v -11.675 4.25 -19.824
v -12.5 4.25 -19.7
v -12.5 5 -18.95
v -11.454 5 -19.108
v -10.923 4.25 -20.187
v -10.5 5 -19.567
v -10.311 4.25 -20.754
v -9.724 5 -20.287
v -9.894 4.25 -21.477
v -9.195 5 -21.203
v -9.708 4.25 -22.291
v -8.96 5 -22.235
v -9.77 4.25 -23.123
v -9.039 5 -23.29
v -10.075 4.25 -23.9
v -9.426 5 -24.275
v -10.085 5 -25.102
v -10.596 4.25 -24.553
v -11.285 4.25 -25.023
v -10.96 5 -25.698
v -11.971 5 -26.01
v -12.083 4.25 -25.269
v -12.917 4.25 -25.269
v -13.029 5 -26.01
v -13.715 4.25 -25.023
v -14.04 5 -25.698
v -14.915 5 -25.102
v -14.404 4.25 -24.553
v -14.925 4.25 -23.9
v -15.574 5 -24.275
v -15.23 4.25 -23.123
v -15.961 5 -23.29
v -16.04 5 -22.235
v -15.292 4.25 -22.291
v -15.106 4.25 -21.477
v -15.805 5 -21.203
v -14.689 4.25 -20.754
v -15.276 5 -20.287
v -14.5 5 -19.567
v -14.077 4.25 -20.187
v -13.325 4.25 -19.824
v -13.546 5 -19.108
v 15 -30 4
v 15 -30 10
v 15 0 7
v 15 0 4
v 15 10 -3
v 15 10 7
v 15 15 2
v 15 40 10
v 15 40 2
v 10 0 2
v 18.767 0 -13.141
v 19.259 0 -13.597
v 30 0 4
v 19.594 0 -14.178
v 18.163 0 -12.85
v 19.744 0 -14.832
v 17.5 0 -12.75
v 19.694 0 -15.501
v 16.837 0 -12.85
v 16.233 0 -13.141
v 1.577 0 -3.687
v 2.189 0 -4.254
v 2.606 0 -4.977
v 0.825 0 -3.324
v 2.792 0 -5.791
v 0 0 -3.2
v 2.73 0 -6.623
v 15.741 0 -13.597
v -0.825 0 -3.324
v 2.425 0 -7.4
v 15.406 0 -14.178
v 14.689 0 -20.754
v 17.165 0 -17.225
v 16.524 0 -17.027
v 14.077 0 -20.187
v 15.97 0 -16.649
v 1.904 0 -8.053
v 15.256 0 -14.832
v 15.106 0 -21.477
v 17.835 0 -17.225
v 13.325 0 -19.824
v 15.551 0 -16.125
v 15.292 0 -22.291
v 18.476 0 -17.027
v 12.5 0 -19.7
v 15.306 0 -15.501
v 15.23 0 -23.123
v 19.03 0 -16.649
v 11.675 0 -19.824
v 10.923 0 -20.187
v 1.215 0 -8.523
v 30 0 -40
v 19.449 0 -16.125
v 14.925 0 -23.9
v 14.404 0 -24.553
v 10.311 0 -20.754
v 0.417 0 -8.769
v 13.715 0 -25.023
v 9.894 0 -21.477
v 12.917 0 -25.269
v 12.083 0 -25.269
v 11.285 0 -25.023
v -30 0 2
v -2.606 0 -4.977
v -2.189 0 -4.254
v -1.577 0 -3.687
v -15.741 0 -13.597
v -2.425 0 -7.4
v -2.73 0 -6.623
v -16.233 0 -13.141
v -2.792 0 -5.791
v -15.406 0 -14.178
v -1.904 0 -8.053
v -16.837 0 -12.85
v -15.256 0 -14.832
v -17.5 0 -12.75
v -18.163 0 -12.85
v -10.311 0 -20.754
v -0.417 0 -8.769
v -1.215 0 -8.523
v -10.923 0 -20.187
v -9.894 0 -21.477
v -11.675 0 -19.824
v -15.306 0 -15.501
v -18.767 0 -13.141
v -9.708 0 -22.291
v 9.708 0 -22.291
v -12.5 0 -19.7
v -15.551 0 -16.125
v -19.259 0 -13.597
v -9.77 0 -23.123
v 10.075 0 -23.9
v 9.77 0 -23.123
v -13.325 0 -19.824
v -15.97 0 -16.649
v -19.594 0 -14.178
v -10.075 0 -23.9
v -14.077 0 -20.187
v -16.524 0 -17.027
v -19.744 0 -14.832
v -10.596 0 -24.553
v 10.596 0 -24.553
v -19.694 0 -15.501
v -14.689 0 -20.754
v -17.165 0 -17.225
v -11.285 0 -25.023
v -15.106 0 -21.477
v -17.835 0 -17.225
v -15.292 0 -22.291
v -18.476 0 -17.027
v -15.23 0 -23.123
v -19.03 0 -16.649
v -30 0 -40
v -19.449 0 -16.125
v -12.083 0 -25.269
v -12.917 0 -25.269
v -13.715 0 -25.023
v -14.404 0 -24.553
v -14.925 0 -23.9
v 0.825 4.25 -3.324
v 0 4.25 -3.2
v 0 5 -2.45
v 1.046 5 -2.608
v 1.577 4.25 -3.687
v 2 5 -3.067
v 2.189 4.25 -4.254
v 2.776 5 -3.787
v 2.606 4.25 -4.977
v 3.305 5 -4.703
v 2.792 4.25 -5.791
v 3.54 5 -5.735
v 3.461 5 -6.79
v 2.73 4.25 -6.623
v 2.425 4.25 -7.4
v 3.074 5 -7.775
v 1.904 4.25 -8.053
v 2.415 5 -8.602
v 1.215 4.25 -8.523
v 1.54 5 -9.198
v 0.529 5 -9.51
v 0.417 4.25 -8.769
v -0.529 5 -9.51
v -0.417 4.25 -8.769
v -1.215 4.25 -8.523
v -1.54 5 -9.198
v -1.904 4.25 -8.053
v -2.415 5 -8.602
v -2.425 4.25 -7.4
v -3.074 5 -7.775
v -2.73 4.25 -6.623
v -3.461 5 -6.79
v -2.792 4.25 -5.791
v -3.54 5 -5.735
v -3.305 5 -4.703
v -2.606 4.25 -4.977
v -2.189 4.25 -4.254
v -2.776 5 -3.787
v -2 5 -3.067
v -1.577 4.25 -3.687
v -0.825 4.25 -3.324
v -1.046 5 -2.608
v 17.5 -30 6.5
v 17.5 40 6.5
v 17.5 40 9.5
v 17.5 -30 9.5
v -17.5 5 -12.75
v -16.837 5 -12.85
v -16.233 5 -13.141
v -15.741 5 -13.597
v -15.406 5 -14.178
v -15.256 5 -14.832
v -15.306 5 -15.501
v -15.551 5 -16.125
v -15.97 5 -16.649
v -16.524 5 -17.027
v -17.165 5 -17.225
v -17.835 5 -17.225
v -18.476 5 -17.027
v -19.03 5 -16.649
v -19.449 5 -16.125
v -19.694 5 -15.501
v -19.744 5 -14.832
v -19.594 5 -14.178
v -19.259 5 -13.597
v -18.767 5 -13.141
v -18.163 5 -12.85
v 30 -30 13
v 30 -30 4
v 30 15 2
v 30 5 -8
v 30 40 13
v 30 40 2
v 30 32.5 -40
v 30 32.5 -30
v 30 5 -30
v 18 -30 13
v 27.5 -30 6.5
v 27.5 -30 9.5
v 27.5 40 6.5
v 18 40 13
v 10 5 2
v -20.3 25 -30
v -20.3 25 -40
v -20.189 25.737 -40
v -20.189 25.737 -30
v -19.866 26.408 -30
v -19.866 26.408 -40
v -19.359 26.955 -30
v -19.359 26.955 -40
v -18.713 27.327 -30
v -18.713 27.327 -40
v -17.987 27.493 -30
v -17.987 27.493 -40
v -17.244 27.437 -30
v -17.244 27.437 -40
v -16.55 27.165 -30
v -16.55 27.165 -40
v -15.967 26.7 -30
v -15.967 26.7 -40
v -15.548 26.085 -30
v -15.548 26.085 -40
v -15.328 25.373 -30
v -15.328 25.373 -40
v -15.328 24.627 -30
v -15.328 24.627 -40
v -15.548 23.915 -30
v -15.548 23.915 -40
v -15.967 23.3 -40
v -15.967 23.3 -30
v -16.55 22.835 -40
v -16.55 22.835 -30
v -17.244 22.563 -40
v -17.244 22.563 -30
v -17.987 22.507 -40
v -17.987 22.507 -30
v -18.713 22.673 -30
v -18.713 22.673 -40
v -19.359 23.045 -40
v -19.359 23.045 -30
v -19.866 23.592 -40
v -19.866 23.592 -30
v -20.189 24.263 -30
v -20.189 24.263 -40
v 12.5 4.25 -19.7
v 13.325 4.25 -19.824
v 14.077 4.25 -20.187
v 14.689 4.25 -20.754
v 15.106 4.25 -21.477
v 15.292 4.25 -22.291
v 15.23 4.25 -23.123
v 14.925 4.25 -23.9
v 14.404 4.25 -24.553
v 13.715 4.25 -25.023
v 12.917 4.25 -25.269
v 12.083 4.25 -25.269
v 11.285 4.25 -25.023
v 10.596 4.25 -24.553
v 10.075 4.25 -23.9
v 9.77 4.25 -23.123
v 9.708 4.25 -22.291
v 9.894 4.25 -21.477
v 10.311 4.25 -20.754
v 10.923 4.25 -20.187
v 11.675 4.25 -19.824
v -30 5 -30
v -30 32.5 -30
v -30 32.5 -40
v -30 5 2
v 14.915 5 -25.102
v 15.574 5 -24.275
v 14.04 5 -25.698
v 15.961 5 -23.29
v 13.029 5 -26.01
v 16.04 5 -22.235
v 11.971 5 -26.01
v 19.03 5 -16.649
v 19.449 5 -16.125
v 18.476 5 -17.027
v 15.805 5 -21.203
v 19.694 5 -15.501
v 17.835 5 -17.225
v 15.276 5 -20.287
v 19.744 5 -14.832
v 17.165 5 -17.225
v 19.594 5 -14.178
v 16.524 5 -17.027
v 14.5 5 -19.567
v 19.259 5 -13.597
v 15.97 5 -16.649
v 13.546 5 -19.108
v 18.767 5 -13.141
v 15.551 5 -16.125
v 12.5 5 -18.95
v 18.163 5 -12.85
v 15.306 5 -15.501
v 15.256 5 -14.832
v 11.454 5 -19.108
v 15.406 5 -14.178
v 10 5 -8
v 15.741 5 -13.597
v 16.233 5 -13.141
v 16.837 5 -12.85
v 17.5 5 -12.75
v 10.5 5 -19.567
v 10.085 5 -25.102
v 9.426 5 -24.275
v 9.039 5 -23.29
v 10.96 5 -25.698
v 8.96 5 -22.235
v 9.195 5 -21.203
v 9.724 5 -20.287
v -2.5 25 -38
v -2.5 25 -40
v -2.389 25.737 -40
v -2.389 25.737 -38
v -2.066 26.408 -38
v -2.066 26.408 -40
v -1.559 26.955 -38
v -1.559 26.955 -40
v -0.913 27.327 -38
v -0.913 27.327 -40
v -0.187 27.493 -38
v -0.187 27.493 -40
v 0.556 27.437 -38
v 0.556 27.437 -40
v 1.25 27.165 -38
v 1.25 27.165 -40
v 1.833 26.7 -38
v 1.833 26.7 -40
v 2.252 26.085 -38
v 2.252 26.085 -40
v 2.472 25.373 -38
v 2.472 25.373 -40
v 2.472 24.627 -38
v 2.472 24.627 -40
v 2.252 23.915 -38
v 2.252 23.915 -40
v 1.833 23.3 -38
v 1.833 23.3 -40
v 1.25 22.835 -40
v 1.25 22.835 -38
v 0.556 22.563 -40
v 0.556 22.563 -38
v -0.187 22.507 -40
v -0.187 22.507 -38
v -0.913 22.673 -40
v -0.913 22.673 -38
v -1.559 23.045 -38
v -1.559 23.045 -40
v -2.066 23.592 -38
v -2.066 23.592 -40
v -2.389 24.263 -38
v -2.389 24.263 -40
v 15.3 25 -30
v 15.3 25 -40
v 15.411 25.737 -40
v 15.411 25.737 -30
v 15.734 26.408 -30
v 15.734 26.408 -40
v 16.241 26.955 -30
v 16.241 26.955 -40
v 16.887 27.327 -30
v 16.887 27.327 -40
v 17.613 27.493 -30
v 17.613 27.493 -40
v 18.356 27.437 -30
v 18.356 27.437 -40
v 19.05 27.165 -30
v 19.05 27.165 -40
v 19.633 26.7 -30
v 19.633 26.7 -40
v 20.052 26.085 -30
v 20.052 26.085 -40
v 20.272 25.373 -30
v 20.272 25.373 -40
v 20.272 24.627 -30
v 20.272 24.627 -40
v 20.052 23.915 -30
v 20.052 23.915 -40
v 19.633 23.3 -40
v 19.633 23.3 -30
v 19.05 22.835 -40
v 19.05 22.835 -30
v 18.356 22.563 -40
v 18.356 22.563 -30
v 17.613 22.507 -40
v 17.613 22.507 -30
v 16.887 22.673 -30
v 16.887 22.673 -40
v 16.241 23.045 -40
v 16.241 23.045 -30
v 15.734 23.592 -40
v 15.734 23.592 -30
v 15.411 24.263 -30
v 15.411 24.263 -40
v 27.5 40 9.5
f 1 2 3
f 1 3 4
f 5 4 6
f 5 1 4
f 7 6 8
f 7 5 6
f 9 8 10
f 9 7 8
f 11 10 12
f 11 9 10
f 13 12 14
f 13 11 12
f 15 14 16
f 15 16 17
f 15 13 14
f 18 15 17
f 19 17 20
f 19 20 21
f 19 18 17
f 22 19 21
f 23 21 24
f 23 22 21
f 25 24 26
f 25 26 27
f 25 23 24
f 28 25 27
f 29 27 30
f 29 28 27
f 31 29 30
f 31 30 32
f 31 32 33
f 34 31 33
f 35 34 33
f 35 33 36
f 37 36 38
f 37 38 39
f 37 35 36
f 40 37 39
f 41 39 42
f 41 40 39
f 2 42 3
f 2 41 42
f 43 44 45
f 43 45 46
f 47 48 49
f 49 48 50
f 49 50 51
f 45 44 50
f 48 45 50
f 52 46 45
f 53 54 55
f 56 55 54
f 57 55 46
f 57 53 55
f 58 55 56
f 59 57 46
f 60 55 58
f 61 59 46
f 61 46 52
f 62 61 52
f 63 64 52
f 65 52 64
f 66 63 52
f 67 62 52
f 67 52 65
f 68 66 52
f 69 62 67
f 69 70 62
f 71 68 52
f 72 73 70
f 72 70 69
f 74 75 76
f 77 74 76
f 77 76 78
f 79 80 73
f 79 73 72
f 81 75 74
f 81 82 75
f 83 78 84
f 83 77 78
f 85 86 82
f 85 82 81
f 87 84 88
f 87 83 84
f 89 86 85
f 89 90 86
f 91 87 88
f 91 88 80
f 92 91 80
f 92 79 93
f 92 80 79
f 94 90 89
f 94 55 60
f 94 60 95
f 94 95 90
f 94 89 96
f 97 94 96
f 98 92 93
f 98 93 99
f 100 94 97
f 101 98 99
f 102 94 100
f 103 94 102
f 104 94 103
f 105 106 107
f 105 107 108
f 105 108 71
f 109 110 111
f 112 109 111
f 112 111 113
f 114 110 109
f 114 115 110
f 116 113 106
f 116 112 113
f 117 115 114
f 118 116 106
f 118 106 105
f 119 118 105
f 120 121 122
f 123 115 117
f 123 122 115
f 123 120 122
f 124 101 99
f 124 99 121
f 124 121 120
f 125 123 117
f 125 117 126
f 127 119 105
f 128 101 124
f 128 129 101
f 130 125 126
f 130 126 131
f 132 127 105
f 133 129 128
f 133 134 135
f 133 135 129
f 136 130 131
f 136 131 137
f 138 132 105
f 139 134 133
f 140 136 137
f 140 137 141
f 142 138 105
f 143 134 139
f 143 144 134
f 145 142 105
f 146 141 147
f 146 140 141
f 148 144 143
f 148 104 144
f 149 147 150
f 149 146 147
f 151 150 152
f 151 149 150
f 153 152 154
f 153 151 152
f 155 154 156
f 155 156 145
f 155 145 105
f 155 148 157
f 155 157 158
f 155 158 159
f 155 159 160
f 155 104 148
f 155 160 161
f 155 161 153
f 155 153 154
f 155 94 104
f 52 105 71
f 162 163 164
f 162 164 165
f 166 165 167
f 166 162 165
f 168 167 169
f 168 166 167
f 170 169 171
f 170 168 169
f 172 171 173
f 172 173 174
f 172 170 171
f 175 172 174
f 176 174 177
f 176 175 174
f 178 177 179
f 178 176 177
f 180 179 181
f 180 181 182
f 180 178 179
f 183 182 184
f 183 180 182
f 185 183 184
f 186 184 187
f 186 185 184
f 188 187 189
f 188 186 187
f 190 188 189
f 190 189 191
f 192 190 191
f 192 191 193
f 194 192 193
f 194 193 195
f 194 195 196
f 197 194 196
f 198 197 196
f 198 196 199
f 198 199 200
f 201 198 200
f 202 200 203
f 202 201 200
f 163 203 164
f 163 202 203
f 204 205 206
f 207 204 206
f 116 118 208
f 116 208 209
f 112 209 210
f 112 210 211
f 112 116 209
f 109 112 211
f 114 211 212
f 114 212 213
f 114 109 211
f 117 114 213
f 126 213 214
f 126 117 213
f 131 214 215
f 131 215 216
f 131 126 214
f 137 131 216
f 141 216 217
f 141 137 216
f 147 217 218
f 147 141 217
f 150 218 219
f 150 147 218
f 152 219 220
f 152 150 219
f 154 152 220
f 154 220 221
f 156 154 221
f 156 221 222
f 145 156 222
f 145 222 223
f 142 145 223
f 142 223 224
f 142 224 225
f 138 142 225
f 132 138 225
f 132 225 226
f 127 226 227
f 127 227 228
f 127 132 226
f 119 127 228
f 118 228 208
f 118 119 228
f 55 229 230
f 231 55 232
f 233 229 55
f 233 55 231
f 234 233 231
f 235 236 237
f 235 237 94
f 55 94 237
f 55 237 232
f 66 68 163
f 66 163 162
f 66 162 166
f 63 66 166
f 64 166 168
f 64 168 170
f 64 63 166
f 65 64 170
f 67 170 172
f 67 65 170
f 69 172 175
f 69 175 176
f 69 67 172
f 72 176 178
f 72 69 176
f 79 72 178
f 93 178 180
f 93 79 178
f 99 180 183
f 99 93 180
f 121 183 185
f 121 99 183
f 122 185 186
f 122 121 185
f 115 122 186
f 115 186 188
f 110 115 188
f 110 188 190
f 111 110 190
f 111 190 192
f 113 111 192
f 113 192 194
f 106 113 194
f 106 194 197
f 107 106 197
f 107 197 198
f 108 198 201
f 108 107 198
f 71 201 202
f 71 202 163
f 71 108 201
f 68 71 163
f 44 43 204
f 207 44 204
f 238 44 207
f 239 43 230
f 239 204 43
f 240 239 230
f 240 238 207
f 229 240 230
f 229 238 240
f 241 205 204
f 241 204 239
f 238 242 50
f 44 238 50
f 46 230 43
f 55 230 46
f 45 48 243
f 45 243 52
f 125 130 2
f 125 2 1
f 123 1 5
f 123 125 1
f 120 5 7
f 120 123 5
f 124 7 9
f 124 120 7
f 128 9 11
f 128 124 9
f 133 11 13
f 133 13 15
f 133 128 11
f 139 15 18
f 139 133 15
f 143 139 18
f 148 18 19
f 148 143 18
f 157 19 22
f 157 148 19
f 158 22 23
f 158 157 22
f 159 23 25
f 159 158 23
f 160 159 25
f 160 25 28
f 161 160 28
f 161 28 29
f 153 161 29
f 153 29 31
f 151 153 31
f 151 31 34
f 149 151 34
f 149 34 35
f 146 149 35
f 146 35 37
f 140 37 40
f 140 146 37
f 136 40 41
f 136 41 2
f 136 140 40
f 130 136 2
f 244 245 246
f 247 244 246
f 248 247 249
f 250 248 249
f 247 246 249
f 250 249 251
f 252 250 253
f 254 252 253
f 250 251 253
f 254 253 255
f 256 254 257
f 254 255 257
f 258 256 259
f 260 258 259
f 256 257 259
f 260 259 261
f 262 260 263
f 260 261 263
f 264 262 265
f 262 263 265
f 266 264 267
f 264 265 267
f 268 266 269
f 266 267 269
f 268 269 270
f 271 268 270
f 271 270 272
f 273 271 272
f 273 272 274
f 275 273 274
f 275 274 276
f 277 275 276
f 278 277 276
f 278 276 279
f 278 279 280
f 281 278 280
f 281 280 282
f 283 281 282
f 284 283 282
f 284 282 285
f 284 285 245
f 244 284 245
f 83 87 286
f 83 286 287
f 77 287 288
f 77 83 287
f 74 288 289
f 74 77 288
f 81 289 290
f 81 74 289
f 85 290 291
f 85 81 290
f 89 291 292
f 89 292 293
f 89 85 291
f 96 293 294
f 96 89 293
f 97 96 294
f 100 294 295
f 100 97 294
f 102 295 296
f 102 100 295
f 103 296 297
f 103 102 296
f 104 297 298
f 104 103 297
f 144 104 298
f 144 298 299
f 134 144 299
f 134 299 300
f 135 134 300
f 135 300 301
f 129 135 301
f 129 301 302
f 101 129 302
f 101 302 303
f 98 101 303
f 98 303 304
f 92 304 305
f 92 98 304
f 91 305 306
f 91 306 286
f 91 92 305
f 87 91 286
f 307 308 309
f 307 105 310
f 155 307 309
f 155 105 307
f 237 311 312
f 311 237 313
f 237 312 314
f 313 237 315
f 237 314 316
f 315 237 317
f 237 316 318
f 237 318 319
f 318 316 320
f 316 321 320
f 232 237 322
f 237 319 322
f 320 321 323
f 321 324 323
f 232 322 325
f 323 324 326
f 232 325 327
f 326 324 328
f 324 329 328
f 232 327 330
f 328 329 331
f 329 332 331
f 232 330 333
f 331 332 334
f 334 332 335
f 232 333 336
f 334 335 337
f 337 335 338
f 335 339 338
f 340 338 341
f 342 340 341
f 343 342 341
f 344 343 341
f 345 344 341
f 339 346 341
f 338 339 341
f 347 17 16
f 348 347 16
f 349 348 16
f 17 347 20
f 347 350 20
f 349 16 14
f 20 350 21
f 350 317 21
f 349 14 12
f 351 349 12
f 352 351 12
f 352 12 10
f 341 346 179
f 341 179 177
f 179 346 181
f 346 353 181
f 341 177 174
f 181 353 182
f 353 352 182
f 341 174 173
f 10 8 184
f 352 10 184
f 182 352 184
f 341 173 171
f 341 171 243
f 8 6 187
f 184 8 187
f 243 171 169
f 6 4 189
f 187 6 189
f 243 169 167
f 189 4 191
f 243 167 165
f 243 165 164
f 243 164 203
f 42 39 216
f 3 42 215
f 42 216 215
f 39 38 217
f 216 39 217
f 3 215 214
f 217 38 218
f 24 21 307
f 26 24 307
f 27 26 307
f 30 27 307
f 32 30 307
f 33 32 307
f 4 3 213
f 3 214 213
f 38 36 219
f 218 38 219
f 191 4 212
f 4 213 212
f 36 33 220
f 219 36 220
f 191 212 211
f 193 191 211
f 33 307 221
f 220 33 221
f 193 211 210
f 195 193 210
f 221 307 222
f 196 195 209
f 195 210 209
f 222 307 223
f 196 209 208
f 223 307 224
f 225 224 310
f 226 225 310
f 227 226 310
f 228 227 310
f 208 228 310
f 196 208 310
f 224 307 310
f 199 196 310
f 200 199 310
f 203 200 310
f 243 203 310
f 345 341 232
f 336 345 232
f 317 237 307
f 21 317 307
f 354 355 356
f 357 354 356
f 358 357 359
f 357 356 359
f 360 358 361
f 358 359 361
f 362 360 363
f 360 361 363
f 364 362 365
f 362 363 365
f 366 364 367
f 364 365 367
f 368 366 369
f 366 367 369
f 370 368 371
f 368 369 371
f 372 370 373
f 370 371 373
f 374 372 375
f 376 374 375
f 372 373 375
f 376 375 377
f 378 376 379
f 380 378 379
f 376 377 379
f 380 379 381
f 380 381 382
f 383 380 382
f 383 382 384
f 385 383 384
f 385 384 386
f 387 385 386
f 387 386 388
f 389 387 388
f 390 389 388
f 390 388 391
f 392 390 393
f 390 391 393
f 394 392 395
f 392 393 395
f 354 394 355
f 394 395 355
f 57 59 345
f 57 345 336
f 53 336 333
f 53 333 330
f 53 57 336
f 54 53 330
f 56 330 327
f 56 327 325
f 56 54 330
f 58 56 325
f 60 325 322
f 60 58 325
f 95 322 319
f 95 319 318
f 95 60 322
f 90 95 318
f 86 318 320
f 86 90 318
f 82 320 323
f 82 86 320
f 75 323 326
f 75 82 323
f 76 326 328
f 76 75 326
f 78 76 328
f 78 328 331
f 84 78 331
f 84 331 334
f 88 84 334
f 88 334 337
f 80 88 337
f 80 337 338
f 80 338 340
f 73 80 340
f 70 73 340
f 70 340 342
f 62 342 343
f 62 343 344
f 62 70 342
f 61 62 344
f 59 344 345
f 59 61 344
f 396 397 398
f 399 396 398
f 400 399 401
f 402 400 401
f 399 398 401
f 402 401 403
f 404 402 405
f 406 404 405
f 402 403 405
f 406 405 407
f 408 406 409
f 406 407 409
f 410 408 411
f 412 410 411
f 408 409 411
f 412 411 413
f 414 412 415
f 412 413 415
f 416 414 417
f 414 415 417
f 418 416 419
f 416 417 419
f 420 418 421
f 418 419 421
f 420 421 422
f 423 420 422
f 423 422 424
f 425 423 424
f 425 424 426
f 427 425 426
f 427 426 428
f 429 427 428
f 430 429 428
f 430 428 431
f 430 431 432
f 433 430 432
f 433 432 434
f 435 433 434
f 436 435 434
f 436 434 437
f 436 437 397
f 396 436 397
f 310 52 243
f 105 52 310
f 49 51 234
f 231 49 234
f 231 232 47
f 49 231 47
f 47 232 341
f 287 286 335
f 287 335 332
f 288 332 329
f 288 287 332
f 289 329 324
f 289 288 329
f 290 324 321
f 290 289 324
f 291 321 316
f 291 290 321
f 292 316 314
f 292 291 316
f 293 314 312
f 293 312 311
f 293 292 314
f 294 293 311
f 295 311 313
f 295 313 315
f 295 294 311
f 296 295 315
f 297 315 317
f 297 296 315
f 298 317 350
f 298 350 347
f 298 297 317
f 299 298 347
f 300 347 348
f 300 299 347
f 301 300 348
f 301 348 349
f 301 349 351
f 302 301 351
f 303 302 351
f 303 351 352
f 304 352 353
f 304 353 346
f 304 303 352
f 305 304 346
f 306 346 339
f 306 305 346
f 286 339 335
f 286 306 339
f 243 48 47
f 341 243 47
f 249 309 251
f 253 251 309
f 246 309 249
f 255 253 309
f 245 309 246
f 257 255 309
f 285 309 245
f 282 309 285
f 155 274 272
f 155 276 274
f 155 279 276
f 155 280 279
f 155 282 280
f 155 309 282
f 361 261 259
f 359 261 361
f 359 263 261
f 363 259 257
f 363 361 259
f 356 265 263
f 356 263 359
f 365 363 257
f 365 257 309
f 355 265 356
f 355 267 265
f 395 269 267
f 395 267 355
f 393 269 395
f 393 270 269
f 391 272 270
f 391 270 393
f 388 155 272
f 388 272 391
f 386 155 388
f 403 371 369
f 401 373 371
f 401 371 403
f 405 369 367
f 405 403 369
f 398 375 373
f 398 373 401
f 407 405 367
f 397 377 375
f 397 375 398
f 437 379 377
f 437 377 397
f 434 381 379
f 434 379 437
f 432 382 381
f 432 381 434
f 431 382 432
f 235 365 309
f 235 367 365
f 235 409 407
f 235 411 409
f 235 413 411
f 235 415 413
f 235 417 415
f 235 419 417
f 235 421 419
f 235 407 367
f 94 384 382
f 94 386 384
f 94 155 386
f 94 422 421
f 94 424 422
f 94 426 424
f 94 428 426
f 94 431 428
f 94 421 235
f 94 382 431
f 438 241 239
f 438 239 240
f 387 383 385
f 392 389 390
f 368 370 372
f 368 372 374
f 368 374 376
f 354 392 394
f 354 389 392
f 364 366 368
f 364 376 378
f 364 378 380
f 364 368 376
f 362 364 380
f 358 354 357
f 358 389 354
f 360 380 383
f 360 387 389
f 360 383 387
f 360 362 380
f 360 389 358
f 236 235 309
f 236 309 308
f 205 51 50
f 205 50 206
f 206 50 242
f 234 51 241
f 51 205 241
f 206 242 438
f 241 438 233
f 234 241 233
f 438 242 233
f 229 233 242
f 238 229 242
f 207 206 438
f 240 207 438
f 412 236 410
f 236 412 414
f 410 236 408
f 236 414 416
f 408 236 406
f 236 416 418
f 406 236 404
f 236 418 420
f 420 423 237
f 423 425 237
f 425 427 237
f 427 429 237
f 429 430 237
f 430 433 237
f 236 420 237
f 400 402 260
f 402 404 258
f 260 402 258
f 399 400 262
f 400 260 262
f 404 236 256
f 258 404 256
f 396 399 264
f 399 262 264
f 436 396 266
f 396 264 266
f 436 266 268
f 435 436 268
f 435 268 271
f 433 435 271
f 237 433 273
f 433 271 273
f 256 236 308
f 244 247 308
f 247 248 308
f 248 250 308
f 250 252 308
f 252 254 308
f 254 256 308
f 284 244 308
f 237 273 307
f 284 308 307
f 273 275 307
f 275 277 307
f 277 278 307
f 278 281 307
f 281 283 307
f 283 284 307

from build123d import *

# Parameters (mm, degrees)
SKETCH1_R                = 2.8
SKETCH1_R_2              = 2.25
BOSS_EXTRUDE1_DEPTH      = 5
SKETCH3_W                = 60
SKETCH3_H                = 10
BOSS_EXTRUDE3_DEPTH      = 27.5
SKETCH4_R                = 2.5
CUT_EXTRUDE1_DEPTH       = 61.993852149
CHAMFER1_SIZE            = 0.75
BOSS_EXTRUDE4_DEPTH      = 30
BOSS_EXTRUDE4_DEPTH_BACK = 40
SKETCH5_W                = 10
SKETCH5_H                = 3
CHAMFER2_SIZE            = 10
CHAMFER3_SIZE            = 5
SKETCH7_W                = 2
SKETCH7_H                = 30
CUT_EXTRUDE2_DEPTH       = 83.462112512
BOSS_EXTRUDE5_DEPTH      = 5
CUT_EXTRUDE3_DEPTH       = 79.89866919
SKETCH10_R               = 2.5
CUT_EXTRUDE4_DEPTH       = 2


with BuildPart() as part:
    # Sketch1 → Boss-Extrude1 (new body)
    with BuildSketch(Plane(origin=(0, 0, 0), x_dir=(1, 0, 0), z_dir=(0, 1, 0))):
        Polygon((-30, 0), (-30, 40), (30, 40), (30, 0), (30, -2), (-30, -2), align=None)
        with Locations(Location((-12.5, 22.5, 0), (0, 0, 270))):
            Circle(SKETCH1_R, mode=Mode.SUBTRACT)
        with Locations(Location((12.5, 22.5, 0), (0, 0, 270))):
            Circle(SKETCH1_R, mode=Mode.SUBTRACT)
        with Locations(Location((-17.5, 15, 0), (0, 0, 270))):
            Circle(SKETCH1_R_2, mode=Mode.SUBTRACT)
        with Locations(Location((17.5, 15, 0), (0, 0, 270))):
            Circle(SKETCH1_R_2, mode=Mode.SUBTRACT)
        with Locations(Location((0, 6, 0), (0, 0, 270))):
            Circle(SKETCH1_R, mode=Mode.SUBTRACT)
    extrude(amount=BOSS_EXTRUDE1_DEPTH)

    # Sketch3 → Boss-Extrude3 (add)
    with BuildSketch(Plane(origin=(0, 5, 0), x_dir=(1, 0, 0), z_dir=(0, 1, 0))):
        with Locations((0, 35)):
            Rectangle(SKETCH3_W, SKETCH3_H)
    extrude(amount=BOSS_EXTRUDE3_DEPTH)

    # Sketch4 → Cut-Extrude1 (cut, through all)
    with BuildSketch(Plane(origin=(0, 0, -40), x_dir=(-1, 0, 0), z_dir=(0, 0, -1))):
        with Locations((-17.8, 25)):
            Circle(SKETCH4_R)
        with Locations((17.8, 25)):
            Circle(SKETCH4_R)
    extrude(amount=-CUT_EXTRUDE1_DEPTH, mode=Mode.SUBTRACT)

    # Chamfer1
    chamfer1_edges = [part.edges().sort_by_distance(p)[0] for p in [
        (-12.5, 5, -25.3),
        (12.5, 5, -25.3),
        (0, 5, -8.8),
    ]]
    chamfer(chamfer1_edges, length=CHAMFER1_SIZE)

    # Sketch5 → Boss-Extrude4 (add, two sides: drawn at the far end of the back side and taken through both)
    with BuildSketch(Plane.XZ.offset(-BOSS_EXTRUDE4_DEPTH_BACK)):
        Polygon((18, 13), (15, 10), (15, 2), (30, 2), (30, 13), align=None)
        with Locations((22.5, 8)):
            Rectangle(SKETCH5_W, SKETCH5_H, mode=Mode.SUBTRACT)
    extrude(amount=BOSS_EXTRUDE4_DEPTH + BOSS_EXTRUDE4_DEPTH_BACK)

    # Chamfer2
    chamfer2_edges = [part.edges().sort_by_distance(p)[0] for p in [
        (22.5, 5, 2),
    ]]
    chamfer(chamfer2_edges, length=CHAMFER2_SIZE)

    # Chamfer3
    chamfer3_edges = [part.edges().sort_by_distance(p)[0] for p in [
        (15, 2.5, 2),
        (15, 5, -3),
    ]]
    chamfer(chamfer3_edges, length=CHAMFER3_SIZE)

    # Sketch7 → Cut-Extrude2 (cut, through all)
    with BuildSketch(Plane(origin=(30, 0, 0), x_dir=(0, 0, -1), z_dir=(1, 0, 0))):
        with Locations((-3, -15)):
            Rectangle(SKETCH7_W, SKETCH7_H)
    extrude(amount=-CUT_EXTRUDE2_DEPTH, mode=Mode.SUBTRACT)

    # Sketch8 → Boss-Extrude5 (add)
    with BuildSketch(Plane(origin=(30, 0, 0), x_dir=(0, 0, -1), z_dir=(1, 0, 0))):
        Polygon((30, 32.5), (-2, 32.5), (-2, 15), (8, 5), (30, 5), align=None)
    extrude(amount=-BOSS_EXTRUDE5_DEPTH)

    # Sketch9 → Cut-Extrude3 (cut, through all)
    with BuildSketch(Plane.ZY.offset(-25)):
        Polygon((-30, 32.5), (-30, 5), (-8, 5), (2, 15), (2, 32.5), align=None)
    extrude(amount=-CUT_EXTRUDE3_DEPTH, mode=Mode.SUBTRACT)

    # Sketch10 → Cut-Extrude4 (cut)
    with BuildSketch(Plane(origin=(0, 0, -40), x_dir=(-1, 0, 0), z_dir=(0, 0, -1))):
        with Locations((0, 25)):
            Circle(SKETCH10_R)
    extrude(amount=-CUT_EXTRUDE4_DEPTH, mode=Mode.SUBTRACT)


solid = part.part
